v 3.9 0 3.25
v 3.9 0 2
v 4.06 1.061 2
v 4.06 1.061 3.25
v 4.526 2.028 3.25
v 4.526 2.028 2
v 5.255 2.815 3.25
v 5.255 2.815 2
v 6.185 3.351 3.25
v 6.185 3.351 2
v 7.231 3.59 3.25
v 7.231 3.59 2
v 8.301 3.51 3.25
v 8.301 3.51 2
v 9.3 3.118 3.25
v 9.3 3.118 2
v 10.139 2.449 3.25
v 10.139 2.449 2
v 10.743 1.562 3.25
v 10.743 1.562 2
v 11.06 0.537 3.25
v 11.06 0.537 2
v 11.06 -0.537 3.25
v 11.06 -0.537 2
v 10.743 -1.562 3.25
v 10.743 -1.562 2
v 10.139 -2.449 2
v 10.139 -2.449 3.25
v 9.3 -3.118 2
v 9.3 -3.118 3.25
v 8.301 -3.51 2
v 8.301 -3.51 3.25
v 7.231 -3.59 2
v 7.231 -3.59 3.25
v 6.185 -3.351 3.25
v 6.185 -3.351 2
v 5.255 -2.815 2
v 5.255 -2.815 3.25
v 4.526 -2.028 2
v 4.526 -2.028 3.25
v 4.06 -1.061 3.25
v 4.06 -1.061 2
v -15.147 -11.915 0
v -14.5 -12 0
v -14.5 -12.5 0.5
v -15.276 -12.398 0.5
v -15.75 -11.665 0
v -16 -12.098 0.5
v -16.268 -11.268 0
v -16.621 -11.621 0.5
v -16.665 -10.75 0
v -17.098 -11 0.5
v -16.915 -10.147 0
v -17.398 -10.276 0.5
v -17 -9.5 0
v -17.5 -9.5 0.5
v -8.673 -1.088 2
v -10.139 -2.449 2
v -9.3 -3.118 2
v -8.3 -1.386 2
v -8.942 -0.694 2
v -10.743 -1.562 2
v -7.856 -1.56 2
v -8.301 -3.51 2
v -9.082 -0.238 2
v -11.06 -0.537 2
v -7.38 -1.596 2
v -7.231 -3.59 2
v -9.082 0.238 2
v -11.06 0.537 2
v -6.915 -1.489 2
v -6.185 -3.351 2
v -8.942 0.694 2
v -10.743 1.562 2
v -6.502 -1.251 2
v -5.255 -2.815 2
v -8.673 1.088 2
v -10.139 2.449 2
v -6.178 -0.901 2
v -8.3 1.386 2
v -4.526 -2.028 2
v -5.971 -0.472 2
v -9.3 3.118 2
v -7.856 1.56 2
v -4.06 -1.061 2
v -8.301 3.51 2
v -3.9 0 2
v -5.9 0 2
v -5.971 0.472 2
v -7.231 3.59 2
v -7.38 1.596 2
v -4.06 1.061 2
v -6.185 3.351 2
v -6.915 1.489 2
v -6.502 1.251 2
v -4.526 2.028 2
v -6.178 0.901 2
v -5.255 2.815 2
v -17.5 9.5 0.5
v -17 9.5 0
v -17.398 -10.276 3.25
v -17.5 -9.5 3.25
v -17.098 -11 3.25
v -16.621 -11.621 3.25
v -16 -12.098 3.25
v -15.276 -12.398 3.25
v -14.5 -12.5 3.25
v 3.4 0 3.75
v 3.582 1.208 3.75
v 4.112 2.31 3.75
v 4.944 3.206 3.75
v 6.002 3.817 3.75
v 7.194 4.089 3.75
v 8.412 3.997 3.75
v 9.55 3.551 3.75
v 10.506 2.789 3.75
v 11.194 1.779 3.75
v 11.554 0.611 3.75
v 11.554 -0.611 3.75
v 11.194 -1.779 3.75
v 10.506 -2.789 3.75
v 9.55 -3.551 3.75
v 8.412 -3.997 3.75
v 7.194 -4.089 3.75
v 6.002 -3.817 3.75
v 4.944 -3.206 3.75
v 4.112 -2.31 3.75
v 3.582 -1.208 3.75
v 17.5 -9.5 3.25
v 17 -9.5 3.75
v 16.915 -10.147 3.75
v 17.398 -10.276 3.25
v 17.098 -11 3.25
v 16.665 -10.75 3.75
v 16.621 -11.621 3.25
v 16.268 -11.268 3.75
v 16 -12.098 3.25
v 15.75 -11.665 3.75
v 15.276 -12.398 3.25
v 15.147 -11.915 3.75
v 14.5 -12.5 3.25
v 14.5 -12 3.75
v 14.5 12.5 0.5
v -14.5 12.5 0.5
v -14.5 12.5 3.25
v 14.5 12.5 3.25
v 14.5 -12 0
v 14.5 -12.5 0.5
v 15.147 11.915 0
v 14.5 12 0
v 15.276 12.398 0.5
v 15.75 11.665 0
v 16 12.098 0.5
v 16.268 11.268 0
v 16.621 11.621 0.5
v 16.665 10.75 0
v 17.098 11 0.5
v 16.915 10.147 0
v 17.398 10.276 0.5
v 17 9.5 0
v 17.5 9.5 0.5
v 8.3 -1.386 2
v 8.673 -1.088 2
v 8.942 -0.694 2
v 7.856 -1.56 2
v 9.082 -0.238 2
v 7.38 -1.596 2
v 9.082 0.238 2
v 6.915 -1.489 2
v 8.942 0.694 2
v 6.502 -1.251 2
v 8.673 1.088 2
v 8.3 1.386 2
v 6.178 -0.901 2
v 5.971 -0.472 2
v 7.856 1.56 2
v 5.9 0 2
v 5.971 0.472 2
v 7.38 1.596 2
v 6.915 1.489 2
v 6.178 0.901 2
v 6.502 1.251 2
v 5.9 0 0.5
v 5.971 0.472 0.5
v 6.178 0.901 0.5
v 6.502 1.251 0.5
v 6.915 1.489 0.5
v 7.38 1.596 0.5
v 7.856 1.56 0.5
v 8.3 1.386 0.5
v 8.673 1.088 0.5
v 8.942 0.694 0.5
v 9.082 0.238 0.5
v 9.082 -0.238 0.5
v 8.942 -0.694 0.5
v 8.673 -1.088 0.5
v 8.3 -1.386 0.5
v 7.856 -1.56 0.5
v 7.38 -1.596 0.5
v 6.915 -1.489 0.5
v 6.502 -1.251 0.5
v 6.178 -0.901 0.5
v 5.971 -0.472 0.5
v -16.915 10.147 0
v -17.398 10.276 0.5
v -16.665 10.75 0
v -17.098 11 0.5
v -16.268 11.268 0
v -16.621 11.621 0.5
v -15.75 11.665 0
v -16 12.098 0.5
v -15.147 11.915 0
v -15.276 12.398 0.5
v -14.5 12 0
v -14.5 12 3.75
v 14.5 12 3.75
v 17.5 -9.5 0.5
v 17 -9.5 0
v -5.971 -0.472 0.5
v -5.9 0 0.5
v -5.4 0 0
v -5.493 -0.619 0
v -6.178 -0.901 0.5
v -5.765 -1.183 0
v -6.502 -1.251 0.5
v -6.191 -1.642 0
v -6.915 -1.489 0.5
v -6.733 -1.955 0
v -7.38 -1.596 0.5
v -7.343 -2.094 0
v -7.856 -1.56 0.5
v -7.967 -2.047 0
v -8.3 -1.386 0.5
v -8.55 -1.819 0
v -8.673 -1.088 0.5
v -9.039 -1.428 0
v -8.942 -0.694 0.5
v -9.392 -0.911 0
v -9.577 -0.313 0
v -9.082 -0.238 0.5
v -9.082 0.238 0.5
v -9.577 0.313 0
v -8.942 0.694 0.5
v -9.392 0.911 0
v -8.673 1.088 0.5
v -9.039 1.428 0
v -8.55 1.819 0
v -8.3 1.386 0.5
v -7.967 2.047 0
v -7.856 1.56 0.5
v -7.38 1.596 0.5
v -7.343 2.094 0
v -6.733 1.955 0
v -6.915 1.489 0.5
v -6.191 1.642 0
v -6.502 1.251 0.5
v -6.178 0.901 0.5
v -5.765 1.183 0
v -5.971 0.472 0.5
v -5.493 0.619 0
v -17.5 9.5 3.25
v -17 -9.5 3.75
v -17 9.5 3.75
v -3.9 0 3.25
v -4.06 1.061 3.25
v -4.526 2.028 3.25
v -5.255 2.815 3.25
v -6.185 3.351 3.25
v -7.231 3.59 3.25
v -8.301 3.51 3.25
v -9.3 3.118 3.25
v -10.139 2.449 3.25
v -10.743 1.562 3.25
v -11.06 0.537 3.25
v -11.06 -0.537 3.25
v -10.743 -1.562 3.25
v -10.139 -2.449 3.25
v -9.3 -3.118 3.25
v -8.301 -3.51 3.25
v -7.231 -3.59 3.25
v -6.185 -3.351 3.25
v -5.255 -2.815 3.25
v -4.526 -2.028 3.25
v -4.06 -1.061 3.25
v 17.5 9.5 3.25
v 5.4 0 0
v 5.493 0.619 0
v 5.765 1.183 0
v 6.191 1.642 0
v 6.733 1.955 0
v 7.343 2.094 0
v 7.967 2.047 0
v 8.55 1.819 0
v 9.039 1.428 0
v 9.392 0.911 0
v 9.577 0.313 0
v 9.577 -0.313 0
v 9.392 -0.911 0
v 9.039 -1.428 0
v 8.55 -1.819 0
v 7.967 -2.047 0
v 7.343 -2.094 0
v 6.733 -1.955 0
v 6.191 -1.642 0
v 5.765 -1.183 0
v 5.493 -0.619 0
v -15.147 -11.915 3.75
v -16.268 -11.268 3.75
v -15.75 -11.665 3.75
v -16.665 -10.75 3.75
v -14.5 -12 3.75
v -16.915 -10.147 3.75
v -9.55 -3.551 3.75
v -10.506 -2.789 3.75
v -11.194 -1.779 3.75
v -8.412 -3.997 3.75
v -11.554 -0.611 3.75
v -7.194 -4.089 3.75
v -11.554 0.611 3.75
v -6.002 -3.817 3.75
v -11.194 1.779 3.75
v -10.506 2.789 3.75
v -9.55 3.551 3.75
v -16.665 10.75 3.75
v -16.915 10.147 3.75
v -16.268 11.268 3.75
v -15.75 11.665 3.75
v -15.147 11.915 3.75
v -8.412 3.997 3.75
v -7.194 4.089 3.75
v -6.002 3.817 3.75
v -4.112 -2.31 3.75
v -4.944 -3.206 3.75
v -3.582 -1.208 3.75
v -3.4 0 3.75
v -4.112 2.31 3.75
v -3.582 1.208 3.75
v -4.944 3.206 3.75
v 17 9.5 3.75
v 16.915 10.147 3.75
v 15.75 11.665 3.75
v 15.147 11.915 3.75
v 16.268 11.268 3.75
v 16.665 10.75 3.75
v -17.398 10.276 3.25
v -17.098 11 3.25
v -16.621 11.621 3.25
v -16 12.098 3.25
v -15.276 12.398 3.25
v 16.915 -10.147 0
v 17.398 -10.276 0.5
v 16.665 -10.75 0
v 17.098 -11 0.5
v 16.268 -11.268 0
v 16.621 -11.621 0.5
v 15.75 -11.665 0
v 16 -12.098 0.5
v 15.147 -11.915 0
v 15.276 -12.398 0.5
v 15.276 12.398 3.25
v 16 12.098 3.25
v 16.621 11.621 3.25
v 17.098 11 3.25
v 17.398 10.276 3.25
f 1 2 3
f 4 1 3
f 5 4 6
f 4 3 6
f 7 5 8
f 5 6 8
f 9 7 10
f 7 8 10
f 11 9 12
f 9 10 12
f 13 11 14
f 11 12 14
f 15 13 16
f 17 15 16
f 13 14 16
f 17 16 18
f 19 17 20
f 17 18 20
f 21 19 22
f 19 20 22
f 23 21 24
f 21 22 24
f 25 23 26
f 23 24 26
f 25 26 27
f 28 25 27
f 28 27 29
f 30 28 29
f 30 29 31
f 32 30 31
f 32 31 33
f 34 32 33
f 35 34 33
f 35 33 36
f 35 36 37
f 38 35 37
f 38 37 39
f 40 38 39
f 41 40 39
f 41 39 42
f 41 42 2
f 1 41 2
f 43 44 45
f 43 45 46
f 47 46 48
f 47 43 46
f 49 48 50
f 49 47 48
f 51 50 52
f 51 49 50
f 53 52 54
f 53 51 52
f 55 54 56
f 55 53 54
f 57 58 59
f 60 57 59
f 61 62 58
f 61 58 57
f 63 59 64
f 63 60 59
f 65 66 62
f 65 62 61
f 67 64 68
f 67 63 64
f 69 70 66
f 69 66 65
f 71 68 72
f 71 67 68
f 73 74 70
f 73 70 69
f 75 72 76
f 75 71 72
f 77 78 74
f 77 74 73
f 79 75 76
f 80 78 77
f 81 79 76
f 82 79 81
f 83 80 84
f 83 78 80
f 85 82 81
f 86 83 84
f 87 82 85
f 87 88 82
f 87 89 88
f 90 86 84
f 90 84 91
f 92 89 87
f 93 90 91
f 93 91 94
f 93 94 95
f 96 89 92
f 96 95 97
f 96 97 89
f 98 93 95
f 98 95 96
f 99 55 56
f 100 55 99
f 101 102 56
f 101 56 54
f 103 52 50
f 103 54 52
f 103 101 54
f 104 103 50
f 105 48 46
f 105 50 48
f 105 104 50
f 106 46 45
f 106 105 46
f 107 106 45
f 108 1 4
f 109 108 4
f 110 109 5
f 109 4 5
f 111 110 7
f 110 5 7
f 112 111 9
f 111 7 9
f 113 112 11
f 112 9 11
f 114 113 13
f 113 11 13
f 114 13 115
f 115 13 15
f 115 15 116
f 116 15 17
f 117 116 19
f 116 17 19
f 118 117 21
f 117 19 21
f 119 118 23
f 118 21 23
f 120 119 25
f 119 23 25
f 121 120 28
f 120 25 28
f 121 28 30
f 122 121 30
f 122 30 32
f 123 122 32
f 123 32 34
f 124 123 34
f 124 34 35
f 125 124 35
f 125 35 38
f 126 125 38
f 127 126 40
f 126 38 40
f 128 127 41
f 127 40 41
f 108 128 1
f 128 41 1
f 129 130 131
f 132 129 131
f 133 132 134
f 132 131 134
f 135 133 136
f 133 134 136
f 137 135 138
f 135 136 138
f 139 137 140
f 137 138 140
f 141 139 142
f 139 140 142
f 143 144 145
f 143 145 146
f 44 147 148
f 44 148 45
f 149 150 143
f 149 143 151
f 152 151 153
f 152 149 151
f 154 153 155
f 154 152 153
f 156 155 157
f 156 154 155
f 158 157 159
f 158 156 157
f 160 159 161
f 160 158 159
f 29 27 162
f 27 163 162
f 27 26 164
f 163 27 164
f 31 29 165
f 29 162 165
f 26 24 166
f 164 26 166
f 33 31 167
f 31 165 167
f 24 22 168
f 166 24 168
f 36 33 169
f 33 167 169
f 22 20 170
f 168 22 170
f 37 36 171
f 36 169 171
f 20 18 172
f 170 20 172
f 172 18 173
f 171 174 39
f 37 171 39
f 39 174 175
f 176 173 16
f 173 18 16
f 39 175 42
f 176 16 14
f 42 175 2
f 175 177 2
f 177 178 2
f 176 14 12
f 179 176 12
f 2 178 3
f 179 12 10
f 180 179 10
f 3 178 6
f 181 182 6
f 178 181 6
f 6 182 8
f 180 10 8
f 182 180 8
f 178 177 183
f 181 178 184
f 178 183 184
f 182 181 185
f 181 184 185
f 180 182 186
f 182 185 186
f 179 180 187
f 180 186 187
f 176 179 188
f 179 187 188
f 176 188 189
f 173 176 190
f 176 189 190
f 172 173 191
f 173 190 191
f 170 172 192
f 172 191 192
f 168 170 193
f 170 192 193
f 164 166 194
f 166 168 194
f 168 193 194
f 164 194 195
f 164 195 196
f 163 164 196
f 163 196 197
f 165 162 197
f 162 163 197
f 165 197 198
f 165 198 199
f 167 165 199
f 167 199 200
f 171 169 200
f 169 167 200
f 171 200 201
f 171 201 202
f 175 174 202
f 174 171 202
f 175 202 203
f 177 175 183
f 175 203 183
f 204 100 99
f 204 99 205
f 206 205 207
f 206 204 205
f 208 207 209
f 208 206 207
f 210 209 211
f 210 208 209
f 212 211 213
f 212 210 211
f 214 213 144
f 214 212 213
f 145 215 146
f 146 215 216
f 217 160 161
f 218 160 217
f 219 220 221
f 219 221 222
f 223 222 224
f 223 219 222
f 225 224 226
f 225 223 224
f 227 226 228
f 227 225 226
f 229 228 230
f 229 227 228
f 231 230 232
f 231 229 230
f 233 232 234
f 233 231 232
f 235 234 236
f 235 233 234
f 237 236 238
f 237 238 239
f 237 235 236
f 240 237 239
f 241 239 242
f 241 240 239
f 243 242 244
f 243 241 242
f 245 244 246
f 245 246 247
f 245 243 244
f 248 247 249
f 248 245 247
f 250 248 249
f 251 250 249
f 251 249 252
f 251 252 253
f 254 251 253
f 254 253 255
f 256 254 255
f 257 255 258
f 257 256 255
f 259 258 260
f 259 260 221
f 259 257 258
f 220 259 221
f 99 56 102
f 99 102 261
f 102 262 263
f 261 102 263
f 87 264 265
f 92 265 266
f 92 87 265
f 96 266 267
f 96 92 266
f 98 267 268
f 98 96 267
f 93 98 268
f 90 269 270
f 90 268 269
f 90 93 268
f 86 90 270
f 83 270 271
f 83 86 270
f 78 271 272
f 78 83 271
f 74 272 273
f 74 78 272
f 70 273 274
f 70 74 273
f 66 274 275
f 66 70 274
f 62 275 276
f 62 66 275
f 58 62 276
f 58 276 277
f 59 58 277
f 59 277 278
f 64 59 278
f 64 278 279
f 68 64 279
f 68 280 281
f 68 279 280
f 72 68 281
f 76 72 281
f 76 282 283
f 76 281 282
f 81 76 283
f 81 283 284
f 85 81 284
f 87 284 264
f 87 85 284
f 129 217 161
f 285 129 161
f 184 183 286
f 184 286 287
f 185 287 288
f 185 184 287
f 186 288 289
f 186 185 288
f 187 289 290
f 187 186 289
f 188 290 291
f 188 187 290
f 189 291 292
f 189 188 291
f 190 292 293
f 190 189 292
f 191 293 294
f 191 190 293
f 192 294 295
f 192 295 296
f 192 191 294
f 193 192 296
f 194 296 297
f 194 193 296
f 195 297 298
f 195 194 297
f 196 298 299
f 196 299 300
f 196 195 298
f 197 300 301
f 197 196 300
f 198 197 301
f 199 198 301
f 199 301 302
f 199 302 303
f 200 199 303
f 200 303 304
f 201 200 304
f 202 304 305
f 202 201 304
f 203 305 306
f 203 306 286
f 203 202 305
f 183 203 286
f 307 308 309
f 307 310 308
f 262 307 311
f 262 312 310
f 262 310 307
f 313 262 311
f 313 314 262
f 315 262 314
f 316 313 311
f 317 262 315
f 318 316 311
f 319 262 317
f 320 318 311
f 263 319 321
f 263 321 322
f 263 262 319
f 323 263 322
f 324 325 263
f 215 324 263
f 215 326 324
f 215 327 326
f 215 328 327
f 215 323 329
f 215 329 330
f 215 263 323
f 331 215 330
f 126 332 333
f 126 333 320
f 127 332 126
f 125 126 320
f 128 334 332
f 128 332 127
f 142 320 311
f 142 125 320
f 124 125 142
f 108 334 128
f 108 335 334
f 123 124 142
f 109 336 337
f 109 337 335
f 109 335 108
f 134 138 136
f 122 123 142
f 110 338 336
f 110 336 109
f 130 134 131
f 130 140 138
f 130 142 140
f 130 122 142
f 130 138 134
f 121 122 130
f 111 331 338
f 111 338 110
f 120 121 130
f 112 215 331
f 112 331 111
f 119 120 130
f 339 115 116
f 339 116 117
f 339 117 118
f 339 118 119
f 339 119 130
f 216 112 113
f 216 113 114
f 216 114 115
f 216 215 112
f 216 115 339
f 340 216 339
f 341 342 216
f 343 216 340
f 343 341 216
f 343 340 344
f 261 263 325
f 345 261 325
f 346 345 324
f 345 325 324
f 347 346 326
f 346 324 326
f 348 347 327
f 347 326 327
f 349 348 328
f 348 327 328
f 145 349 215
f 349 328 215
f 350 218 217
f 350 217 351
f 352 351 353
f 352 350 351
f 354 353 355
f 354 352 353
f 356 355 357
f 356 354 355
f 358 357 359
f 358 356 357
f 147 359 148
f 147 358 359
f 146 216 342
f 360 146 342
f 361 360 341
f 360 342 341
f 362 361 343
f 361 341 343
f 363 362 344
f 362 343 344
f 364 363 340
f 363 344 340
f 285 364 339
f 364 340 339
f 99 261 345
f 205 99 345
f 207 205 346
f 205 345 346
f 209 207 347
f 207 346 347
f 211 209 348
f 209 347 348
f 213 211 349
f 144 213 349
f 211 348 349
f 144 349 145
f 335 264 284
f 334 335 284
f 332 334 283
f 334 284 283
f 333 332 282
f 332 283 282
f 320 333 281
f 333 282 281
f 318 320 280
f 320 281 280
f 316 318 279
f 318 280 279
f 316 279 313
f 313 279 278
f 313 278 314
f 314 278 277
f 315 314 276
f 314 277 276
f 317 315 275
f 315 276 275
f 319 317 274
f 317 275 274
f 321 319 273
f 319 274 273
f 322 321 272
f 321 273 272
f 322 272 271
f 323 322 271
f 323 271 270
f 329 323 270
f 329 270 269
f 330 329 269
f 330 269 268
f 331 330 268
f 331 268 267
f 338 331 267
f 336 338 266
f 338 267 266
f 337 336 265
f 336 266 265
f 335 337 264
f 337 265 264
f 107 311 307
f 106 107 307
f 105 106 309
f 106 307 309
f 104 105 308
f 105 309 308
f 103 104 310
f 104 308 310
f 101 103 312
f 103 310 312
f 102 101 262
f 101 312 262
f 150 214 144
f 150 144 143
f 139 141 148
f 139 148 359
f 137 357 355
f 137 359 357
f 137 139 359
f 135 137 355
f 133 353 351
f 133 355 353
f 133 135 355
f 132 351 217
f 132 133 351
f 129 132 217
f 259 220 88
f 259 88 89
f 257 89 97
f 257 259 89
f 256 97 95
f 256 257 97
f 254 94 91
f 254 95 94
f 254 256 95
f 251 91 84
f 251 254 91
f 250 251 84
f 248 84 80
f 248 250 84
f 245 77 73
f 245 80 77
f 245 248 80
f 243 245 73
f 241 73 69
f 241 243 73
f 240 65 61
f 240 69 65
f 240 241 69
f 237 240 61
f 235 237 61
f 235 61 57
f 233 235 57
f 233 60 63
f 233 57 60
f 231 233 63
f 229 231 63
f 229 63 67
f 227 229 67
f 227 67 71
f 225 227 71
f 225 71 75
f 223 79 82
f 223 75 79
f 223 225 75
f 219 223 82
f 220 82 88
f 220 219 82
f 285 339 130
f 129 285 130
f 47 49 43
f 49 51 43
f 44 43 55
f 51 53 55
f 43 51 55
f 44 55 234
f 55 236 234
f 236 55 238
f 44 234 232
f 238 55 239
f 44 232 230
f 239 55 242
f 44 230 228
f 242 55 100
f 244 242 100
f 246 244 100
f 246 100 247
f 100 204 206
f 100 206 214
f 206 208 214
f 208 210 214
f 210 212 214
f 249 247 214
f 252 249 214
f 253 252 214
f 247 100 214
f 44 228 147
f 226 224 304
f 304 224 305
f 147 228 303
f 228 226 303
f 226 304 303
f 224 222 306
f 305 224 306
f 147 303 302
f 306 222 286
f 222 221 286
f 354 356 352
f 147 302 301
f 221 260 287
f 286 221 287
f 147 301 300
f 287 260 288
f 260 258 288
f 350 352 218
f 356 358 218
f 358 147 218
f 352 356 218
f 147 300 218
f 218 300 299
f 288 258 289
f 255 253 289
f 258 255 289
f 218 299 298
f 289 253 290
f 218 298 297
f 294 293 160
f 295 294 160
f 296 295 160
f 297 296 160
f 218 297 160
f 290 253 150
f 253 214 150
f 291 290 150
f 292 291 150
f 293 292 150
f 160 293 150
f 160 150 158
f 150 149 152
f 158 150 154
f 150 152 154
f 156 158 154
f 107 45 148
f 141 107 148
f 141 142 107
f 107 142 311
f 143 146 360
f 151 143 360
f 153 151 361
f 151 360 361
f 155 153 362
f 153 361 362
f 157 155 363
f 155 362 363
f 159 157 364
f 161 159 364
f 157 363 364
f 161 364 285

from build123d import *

# Parameters (mm, degrees)
CYLINDER001_R     = 3.6
CYLINDER001_DEPTH = 10
CYLINDER_R        = 1.6
CYLINDER_DEPTH    = 10
BOX_W             = 35
BOX_H             = 25
BOX_DEPTH         = 3.75
FILLET_R          = 3
CHAMFER_SIZE      = 0.5


with BuildPart() as cylinder001:
    # Cylinder001 → Cylinder001 (new body)
    with BuildSketch(Plane(origin=(-7.5, 0, 2), x_dir=(1, 0, 0), z_dir=(0, 0, 1))):
        Circle(CYLINDER001_R)
    extrude(amount=CYLINDER001_DEPTH)


with BuildPart() as fusion:
    # Cylinder → Cylinder (new body)
    with BuildSketch(Plane(origin=(-7.5, 0, -1), x_dir=(1, 0, 0), z_dir=(0, 0, 1))):
        Circle(CYLINDER_R)
    extrude(amount=CYLINDER_DEPTH)

    # Fusion: union Cylinder001
    add(cylinder001.part)


with BuildPart() as part_mirroring:
    # Part__Mirroring: instance of Fusion
    add(fusion.part.mirror(Plane(origin=(0, 0, 0), x_dir=(0, -1, 0), z_dir=(1, 0, 0))))


with BuildPart() as fusion001:
    # Fusion001 base: copy of Fusion
    add(fusion.part)

    # Fusion001: union Part__Mirroring
    add(part_mirroring.part)


with BuildPart() as mountplate:
    # Box → Box (new body)
    with BuildSketch(Plane(origin=(-17.5, -12.5, 0), x_dir=(1, 0, 0), z_dir=(0, 0, 1))):
        with Locations((17.5, 12.5)):
            Rectangle(BOX_W, BOX_H)
    extrude(amount=BOX_DEPTH)

    # Cut001: cut Fusion001
    add(fusion001.part, mode=Mode.SUBTRACT)

    # Fillet
    fillet_edges = [mountplate.edges().sort_by_distance(p)[0] for p in [
        (-17.5, -12.5, 1.875),
        (-17.5, 12.5, 1.875),
        (17.5, -12.5, 1.875),
        (17.5, 12.5, 1.875),
    ]]
    fillet(fillet_edges, radius=FILLET_R)

    # Chamfer
    chamfer_edges = [mountplate.edges().sort_by_distance(p)[0] for p in [
        (-17.5, 0, 3.75),
        (-17.5, 0, 0),
        (-16.62132, -11.62132, 3.75),
        (-16.62132, 11.62132, 3.75),
        (0, -12.5, 3.75),
        (0, 12.5, 3.75),
        (16.62132, -11.62132, 3.75),
        (16.62132, 11.62132, 3.75),
        (17.5, 0, 3.75),
        (-11.1, 0, 3.75),
        (11.1, 0, 3.75),
        (-16.62132, -11.62132, 0),
        (-16.62132, 11.62132, 0),
        (0, -12.5, 0),
        (0, 12.5, 0),
        (16.62132, -11.62132, 0),
        (16.62132, 11.62132, 0),
        (17.5, 0, 0),
        (-9.1, 0, 0),
        (9.1, 0, 0),
    ]]
    chamfer(chamfer_edges, length=CHAMFER_SIZE)


solid = mountplate.part
